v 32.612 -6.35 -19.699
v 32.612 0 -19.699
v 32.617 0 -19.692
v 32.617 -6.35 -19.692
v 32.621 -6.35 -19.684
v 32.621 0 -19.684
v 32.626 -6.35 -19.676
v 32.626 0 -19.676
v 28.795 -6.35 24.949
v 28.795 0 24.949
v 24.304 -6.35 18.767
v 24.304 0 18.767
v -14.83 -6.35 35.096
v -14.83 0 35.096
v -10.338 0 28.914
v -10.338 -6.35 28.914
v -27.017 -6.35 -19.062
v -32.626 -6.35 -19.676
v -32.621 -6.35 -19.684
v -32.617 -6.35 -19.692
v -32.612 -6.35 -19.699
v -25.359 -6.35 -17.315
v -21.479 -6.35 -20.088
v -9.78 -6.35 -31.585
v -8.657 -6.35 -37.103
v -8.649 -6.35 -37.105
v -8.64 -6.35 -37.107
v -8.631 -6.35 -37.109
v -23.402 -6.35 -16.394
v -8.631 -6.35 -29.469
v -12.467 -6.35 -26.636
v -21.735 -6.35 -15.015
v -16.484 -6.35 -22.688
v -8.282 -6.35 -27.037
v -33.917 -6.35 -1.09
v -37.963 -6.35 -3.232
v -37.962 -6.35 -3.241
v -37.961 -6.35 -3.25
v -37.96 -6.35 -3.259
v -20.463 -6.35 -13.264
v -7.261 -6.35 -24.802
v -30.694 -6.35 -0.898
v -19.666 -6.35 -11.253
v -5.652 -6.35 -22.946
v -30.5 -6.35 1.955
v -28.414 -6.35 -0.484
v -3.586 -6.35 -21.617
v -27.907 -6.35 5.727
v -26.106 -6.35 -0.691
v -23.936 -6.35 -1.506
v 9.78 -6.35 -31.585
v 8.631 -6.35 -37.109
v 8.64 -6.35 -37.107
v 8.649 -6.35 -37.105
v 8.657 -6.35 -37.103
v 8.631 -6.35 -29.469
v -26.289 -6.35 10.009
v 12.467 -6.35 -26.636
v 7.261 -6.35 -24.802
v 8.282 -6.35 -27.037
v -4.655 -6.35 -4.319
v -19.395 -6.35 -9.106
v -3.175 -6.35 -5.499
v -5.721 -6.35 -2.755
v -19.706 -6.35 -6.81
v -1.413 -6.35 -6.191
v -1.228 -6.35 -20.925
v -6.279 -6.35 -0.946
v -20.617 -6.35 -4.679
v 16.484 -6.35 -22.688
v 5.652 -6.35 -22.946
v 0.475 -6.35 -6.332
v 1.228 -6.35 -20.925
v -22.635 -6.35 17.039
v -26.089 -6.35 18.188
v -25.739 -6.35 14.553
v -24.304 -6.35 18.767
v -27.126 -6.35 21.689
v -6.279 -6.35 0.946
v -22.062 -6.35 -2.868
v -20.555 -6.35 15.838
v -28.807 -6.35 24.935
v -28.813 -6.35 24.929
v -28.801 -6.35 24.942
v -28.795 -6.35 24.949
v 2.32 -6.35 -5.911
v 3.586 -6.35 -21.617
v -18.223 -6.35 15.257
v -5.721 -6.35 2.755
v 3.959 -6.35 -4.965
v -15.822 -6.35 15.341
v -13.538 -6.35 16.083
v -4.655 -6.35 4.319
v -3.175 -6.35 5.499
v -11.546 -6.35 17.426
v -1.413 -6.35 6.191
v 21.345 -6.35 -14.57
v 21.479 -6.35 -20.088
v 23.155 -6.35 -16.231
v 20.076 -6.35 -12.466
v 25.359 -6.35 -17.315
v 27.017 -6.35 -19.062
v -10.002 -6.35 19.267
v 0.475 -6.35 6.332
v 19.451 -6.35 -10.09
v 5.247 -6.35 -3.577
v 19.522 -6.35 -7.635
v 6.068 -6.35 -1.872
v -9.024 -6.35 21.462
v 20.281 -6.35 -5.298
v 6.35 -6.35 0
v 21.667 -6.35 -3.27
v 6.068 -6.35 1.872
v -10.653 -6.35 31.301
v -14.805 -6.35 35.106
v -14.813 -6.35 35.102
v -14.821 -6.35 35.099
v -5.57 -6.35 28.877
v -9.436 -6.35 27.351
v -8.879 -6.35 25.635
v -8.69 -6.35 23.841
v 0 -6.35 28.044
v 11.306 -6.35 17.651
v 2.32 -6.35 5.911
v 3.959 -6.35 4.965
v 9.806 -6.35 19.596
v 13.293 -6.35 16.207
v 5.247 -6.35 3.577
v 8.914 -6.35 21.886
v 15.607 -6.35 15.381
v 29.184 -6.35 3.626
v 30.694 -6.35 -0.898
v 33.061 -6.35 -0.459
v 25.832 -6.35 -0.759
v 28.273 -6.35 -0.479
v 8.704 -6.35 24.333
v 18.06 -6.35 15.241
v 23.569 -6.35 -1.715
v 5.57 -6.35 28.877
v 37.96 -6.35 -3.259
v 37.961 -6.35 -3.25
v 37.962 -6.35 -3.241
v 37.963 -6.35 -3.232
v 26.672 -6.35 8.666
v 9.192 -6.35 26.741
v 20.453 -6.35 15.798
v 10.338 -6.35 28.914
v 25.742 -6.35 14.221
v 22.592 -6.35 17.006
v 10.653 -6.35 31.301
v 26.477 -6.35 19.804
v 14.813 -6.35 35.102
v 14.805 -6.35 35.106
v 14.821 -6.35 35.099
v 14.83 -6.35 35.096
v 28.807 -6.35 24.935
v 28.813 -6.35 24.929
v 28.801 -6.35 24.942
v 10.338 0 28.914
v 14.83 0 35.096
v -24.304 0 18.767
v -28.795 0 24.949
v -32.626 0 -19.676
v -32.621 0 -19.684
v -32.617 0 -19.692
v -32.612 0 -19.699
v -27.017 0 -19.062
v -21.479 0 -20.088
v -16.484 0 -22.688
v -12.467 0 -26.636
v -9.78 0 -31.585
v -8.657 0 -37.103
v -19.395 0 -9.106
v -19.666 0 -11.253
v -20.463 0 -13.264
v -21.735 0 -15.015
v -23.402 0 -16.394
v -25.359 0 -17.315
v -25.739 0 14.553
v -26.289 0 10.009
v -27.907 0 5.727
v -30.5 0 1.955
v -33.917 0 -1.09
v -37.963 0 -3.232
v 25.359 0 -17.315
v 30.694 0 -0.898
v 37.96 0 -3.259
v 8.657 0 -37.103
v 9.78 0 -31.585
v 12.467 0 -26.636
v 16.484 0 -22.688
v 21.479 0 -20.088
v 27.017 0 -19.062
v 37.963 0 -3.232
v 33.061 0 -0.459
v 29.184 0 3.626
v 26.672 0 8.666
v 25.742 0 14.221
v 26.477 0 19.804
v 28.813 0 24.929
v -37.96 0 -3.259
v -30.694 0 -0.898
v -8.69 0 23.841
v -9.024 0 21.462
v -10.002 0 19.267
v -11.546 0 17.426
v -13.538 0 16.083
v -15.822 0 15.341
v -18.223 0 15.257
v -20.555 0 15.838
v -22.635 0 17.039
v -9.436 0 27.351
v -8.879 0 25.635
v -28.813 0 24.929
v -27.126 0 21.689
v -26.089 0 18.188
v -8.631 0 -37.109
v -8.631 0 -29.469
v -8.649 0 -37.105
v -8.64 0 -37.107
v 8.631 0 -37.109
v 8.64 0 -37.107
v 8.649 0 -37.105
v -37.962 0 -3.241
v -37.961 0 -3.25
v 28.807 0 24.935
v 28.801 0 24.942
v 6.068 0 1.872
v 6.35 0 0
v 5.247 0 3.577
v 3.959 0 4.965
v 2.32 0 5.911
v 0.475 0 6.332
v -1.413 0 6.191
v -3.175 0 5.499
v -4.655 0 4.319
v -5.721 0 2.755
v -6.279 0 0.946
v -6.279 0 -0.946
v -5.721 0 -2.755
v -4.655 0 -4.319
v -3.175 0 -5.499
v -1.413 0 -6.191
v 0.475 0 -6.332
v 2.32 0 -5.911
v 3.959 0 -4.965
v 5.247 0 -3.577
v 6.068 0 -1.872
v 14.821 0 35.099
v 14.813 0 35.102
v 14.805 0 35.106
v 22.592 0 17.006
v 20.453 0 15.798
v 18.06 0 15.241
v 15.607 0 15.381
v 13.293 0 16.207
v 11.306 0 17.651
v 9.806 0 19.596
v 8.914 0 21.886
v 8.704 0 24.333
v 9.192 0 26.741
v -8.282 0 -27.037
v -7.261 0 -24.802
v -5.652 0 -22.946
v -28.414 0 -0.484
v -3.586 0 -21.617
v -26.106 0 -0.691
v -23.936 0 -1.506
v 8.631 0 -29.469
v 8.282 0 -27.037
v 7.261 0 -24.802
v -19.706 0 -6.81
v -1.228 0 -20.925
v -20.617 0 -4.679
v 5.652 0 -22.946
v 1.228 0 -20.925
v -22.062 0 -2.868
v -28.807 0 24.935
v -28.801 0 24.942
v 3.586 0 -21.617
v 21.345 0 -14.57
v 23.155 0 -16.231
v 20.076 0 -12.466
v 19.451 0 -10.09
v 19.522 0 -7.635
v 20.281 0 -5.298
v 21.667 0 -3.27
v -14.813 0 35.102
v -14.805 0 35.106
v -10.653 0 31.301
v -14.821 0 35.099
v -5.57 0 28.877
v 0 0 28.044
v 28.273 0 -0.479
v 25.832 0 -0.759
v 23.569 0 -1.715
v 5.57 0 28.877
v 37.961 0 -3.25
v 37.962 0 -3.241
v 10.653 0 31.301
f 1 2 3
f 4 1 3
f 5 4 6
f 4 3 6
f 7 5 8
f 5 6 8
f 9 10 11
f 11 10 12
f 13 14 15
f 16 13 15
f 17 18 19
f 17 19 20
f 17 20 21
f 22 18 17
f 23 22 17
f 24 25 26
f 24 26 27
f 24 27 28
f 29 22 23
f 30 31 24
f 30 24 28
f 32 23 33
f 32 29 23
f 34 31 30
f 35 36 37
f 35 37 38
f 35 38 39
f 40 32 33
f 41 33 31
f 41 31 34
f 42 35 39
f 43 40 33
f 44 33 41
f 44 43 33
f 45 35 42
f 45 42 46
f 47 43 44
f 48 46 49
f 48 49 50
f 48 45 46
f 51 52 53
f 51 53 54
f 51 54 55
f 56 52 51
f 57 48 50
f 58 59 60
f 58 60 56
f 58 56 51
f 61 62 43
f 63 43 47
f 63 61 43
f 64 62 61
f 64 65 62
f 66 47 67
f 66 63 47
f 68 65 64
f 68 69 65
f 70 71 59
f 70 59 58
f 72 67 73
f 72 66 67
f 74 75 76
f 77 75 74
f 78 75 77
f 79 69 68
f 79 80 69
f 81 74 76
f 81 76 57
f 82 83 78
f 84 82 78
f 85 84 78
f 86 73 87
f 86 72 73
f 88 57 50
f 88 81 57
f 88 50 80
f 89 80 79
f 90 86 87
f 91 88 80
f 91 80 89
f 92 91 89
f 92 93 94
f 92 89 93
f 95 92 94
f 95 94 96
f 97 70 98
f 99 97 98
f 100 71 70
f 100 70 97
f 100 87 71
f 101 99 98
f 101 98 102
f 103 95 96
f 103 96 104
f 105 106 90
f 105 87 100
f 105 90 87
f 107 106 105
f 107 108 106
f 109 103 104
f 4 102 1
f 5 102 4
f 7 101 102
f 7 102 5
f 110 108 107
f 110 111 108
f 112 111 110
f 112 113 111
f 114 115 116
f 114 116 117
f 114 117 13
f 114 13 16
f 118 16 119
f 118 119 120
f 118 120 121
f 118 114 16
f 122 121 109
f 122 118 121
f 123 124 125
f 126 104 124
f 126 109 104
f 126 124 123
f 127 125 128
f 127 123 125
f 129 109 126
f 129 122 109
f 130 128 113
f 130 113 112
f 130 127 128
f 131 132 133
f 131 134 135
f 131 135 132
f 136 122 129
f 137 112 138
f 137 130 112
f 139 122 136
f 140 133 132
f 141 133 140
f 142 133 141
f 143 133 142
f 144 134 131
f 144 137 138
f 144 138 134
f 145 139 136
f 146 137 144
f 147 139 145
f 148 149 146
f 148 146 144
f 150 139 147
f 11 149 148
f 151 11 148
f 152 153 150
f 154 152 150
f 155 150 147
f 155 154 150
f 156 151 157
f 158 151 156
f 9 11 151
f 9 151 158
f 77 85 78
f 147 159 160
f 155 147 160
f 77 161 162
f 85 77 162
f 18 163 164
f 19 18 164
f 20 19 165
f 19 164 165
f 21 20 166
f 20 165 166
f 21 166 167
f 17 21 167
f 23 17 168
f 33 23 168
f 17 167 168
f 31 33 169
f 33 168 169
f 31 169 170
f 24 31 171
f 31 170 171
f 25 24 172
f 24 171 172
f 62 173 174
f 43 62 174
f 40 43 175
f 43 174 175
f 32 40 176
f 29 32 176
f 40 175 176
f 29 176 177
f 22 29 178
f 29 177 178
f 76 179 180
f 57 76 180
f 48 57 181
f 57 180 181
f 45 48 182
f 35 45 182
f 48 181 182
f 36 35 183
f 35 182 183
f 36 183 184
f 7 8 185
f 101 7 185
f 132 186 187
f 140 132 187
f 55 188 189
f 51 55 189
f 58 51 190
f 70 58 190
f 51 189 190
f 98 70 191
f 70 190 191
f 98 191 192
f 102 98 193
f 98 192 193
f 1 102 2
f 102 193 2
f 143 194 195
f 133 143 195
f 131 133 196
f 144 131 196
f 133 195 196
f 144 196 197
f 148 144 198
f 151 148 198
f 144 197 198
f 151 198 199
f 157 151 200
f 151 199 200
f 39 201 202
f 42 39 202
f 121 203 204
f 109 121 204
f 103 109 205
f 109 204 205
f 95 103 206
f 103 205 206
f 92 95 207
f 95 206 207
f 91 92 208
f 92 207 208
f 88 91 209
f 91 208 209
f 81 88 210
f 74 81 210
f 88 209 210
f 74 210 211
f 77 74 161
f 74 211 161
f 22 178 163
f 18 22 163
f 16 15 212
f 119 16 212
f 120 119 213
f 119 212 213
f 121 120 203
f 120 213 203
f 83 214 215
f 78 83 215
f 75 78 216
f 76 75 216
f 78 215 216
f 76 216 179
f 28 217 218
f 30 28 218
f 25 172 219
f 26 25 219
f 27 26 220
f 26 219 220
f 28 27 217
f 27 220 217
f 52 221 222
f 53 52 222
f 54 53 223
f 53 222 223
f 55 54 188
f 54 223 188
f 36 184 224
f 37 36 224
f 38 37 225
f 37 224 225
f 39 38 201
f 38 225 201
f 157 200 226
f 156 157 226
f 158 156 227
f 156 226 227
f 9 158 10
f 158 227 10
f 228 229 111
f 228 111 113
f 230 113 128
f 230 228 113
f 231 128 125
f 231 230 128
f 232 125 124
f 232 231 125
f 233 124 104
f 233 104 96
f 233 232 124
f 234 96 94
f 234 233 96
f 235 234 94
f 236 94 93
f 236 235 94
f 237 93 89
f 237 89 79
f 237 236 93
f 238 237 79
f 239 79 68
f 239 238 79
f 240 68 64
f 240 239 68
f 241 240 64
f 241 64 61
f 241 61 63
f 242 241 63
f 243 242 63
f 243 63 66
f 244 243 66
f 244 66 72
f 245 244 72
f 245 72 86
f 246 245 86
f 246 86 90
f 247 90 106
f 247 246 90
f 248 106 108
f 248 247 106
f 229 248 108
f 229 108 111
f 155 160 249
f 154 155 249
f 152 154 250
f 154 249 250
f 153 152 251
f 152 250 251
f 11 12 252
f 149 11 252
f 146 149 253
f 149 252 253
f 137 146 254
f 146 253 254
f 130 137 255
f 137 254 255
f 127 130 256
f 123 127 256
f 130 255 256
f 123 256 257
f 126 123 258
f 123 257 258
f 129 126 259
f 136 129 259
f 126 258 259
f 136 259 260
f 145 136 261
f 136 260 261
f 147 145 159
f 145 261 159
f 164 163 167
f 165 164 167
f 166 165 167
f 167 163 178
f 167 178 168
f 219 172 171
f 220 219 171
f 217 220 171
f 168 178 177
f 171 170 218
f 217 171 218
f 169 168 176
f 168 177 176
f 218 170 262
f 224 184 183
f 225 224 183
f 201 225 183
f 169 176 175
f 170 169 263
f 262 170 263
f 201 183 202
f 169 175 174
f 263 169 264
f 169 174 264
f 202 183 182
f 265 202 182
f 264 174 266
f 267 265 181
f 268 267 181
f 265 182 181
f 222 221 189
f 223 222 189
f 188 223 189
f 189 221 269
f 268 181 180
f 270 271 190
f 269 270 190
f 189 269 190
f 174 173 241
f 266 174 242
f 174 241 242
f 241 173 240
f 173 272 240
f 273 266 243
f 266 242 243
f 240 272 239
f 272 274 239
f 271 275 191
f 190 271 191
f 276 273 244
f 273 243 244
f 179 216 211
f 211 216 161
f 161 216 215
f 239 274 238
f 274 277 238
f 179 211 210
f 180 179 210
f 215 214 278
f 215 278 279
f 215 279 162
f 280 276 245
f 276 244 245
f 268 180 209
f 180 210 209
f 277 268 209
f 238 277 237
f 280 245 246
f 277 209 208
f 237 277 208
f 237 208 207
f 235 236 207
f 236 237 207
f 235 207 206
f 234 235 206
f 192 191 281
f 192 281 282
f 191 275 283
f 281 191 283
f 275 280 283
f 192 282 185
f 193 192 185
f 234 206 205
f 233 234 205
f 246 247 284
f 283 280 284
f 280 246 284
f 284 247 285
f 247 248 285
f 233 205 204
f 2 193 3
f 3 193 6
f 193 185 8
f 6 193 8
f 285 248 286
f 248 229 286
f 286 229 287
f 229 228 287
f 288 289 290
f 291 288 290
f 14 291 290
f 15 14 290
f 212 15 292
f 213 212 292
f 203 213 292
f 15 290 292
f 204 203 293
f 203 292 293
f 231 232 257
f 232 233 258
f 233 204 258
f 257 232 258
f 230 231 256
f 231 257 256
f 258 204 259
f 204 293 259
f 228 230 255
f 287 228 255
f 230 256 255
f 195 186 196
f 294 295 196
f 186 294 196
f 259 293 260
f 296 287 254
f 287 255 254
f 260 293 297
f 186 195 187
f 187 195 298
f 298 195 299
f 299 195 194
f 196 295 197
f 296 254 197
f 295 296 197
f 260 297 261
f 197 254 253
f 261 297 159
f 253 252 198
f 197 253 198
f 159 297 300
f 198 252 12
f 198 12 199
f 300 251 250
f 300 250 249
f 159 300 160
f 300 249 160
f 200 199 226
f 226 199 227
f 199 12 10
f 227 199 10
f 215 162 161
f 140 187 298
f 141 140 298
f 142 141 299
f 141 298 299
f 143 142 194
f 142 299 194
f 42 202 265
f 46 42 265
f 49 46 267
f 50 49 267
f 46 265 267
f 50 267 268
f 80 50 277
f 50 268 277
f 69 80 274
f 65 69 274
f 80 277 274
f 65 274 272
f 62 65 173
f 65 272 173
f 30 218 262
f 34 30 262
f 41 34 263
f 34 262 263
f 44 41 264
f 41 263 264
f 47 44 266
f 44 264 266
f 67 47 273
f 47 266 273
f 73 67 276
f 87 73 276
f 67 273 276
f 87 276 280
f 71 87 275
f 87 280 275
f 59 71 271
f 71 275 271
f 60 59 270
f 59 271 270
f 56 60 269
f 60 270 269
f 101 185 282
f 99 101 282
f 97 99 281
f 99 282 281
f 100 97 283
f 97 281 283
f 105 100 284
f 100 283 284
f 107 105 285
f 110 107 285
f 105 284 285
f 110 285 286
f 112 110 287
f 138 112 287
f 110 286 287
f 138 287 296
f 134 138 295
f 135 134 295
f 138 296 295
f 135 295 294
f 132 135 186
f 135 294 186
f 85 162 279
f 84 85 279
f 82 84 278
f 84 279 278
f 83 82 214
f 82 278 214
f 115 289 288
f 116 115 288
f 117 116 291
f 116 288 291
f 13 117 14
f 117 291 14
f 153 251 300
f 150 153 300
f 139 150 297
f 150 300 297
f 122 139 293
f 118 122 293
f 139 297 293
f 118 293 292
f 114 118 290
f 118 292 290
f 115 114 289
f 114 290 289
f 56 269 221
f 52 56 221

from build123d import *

# Parameters (mm, degrees)
F0_R     = 6.35
F1_DEPTH = 6.35


with BuildPart() as f1:
    # F0 (on Front) → F1 (new body)
    with BuildSketch(Plane.XZ):
        with BuildLine():
            ThreePointArc((8.63127, -37.109449), (8.644315, -37.106412), (8.657358, -37.103371))
            ThreePointArc((8.657358, -37.103371), (16.483961, -22.688226), (32.612132, -19.699209))
            ThreePointArc((32.612132, -19.699209), (32.619055, -19.687744), (32.625974, -19.676276))
            Line((32.625974, -19.676276), (25.359218, -17.315164))
            ThreePointArc((25.359218, -17.315164), (19.817602, -6.439129), (30.693637, -0.897512))
            Line((30.693637, -0.897512), (37.960392, -3.258624))
            ThreePointArc((37.960392, -3.258624), (37.961535, -3.24528), (37.962674, -3.231935))
            ThreePointArc((37.962674, -3.231935), (26.67161, 8.666131), (28.812764, 24.92859))
            ThreePointArc((28.812764, 24.92859), (28.803999, 24.938717), (28.795231, 24.948841))
            Line((28.795231, 24.948841), (24.304129, 18.76737))
            ThreePointArc((24.304129, 18.76737), (12.247951, 16.857859), (10.33844, 28.914037))
            Line((10.33844, 28.914037), (14.829542, 35.095508))
            ThreePointArc((14.829542, 35.095508), (14.817204, 35.100719), (14.804864, 35.105925))
            ThreePointArc((14.804864, 35.105925), (0, 28.04419), (-14.804864, 35.105925))
            ThreePointArc((-14.804864, 35.105925), (-14.817204, 35.100719), (-14.829542, 35.095508))
            Line((-14.829542, 35.095508), (-10.33844, 28.914037))
            ThreePointArc((-10.33844, 28.914037), (-9.112459, 26.507912), (-8.690014, 23.840703))
            ThreePointArc((-8.690014, 23.840703), (-14.654076, 15.631877), (-24.304129, 18.76737))
            Line((-24.304129, 18.76737), (-28.795231, 24.948841))
            ThreePointArc((-28.795231, 24.948841), (-28.803999, 24.938717), (-28.812764, 24.92859))
            ThreePointArc((-28.812764, 24.92859), (-26.523773, 19.963575), (-25.739236, 14.552905))
            ThreePointArc((-25.739236, 14.552905), (-29.089738, 3.762713), (-37.962674, -3.231935))
            ThreePointArc((-37.962674, -3.231935), (-37.961535, -3.24528), (-37.960392, -3.258624))
            Line((-37.960392, -3.258624), (-30.693637, -0.897512))
            ThreePointArc((-30.693637, -0.897512), (-22.953094, -2.123494), (-19.395157, -9.106338))
            ThreePointArc((-19.395157, -9.106338), (-21.043583, -14.179672), (-25.359218, -17.315164))
            Line((-25.359218, -17.315164), (-32.625974, -19.676276))
            ThreePointArc((-32.625974, -19.676276), (-32.619055, -19.687744), (-32.612132, -19.699209))
            ThreePointArc((-32.612132, -19.699209), (-16.483961, -22.688226), (-8.657358, -37.103371))
            ThreePointArc((-8.657358, -37.103371), (-8.644315, -37.106412), (-8.63127, -37.109449))
            Line((-8.63127, -37.109449), (-8.63127, -29.46873))
            ThreePointArc((-8.63127, -29.46873), (0, -20.837459), (8.63127, -29.46873))
            Line((8.63127, -29.46873), (8.63127, -37.109449))
        make_face()
        Circle(F0_R, mode=Mode.SUBTRACT)
    extrude(amount=F1_DEPTH)


solid = f1.part
